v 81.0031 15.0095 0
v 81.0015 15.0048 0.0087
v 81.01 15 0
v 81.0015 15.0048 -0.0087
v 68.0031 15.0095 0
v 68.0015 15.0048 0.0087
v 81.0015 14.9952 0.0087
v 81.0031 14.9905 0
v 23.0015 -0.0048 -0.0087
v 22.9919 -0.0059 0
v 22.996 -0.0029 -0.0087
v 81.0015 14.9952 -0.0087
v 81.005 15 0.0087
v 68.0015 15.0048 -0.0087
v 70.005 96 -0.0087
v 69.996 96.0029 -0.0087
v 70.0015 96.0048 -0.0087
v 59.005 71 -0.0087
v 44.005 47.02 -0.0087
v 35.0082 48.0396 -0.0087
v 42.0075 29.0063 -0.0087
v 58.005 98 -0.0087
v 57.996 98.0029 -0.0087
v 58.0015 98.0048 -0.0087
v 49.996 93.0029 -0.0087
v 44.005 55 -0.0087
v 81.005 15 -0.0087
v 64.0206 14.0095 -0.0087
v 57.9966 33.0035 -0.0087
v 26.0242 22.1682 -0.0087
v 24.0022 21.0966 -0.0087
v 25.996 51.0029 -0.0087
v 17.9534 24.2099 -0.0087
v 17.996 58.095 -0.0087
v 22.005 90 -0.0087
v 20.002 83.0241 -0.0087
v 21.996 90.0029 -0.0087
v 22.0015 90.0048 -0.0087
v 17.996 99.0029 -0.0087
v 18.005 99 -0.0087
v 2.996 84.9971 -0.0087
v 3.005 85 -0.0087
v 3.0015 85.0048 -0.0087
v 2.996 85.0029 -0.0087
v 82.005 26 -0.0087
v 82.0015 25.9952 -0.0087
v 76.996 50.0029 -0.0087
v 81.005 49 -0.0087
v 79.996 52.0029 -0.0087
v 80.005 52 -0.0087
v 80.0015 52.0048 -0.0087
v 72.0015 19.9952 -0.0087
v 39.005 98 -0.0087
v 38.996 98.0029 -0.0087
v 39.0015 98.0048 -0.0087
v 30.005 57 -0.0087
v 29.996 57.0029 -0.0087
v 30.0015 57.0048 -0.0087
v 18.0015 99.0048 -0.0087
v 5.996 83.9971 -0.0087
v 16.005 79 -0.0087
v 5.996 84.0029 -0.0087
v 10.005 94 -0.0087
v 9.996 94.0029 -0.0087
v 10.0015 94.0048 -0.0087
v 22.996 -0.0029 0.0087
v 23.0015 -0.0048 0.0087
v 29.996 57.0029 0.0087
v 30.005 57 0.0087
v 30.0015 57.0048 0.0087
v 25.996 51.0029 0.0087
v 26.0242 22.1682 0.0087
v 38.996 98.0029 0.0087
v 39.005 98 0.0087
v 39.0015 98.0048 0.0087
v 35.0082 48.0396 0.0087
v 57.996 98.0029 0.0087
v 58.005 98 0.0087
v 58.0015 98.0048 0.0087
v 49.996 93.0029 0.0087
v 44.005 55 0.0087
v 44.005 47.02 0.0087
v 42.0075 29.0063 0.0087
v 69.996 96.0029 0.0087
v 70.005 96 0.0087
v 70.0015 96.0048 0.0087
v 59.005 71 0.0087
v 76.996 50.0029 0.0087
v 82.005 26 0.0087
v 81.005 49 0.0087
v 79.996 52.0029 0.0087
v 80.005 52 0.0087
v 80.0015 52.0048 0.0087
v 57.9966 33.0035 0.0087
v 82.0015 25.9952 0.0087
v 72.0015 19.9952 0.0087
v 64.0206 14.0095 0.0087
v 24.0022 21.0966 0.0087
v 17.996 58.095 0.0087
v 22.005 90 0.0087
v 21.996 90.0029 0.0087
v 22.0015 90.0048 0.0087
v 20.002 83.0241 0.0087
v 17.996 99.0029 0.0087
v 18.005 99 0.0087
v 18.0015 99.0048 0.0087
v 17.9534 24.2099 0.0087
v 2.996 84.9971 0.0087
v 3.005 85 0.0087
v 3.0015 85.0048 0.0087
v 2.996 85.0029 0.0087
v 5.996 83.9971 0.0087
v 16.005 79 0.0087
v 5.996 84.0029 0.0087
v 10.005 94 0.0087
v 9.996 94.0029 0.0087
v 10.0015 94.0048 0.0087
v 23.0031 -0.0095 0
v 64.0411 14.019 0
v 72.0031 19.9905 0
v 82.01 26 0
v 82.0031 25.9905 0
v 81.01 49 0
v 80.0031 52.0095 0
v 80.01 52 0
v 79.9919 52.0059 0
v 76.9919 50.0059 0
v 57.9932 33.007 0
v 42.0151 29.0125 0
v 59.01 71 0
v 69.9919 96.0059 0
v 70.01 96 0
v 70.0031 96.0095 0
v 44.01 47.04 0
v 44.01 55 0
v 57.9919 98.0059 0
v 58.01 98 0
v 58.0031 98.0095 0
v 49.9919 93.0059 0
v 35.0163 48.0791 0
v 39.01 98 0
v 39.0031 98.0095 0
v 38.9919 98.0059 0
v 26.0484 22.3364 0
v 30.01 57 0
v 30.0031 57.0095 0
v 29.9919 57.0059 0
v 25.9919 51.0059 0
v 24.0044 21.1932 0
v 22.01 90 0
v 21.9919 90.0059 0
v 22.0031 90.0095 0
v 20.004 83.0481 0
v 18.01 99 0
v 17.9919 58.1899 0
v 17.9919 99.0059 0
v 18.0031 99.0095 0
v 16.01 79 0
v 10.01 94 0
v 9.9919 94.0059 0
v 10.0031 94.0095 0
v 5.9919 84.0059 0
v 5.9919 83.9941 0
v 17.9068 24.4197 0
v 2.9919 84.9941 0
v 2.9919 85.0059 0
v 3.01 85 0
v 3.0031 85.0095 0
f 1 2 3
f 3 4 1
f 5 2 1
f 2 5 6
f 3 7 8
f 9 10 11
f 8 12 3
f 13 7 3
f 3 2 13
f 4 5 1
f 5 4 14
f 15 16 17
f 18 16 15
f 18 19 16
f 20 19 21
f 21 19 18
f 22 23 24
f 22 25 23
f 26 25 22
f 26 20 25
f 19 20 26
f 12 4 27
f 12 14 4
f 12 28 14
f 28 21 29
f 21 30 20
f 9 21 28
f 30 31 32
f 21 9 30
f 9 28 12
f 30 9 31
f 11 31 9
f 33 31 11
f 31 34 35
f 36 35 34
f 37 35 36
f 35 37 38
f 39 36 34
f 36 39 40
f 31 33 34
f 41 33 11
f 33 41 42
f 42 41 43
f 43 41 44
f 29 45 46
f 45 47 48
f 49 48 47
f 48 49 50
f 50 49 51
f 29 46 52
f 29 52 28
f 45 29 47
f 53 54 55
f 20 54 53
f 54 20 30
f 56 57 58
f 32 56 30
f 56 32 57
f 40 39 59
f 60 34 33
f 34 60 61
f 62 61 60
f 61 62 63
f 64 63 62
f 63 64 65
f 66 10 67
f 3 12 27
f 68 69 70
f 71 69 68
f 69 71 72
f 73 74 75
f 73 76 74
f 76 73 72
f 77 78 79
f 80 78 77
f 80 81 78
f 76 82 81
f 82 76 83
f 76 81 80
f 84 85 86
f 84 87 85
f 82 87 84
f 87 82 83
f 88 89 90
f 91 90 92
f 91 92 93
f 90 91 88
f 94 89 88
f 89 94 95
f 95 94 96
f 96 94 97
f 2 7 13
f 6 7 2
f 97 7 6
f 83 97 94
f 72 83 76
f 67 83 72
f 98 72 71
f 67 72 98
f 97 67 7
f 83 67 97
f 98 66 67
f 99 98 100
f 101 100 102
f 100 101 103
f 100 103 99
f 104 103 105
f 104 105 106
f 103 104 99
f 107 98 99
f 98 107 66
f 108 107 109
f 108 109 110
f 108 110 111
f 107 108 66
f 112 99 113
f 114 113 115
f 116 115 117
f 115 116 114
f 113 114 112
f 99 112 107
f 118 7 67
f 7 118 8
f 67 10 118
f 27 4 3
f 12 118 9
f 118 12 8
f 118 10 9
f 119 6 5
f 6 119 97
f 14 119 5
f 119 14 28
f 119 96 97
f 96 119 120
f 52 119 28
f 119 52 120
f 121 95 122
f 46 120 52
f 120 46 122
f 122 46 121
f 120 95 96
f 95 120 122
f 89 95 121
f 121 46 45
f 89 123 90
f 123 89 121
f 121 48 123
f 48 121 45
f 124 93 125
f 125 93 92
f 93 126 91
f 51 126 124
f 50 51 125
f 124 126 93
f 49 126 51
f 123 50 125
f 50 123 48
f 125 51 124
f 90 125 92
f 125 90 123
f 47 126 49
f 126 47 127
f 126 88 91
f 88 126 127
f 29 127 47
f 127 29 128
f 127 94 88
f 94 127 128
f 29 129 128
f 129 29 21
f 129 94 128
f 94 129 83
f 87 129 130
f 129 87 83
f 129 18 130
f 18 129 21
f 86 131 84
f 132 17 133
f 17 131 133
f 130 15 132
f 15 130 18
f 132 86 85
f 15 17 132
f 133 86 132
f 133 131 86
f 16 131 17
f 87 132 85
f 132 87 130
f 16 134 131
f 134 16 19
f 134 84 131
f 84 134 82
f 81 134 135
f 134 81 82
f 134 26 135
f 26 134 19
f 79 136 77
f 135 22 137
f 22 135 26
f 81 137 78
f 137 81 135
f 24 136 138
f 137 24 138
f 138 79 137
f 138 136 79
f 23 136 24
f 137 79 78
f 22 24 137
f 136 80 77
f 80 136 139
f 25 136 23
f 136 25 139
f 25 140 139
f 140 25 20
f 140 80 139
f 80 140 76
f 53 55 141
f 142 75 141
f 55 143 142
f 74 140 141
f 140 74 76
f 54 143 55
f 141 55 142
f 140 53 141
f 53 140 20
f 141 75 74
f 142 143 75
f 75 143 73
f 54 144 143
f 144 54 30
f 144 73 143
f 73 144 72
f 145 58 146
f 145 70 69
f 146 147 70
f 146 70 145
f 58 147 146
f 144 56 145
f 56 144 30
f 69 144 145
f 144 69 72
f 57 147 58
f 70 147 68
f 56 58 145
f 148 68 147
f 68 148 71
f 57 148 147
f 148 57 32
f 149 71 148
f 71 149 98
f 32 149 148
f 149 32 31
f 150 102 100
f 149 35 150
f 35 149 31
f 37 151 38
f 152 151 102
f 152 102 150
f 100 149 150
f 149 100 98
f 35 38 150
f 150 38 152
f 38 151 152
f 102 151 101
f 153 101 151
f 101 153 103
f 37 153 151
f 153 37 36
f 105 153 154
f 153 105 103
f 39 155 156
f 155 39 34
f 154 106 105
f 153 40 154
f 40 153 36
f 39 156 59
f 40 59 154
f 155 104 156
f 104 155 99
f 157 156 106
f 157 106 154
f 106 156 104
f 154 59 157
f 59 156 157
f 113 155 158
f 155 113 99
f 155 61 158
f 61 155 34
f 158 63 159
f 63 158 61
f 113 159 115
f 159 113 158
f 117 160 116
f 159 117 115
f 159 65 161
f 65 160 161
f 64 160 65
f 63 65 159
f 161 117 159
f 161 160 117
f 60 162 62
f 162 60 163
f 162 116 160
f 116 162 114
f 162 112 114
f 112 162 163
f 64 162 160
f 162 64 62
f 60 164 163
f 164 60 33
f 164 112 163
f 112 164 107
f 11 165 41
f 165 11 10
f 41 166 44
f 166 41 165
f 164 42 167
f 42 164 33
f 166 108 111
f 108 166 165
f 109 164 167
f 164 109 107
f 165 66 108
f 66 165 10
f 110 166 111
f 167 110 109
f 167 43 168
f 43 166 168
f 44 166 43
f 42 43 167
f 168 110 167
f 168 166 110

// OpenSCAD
color([0.9135118305629362,0.3823609034395232,0.42581309278619206]) hull(){
    translate([23,0]) sphere(0.01);
    translate([81,15]) sphere(0.01);
    translate([68,15]) sphere(0.01);
}
color([0.08967296065919184,0.0016857337534631478,0.31287848776698257]) hull(){
    translate([23,0]) sphere(0.01);
    translate([68,15]) sphere(0.01);
    translate([64,14]) sphere(0.01);
}
color([0.09731792302828757,0.364404074066101,0.8754307508322564]) hull(){
    translate([23,0]) sphere(0.01);
    translate([64,14]) sphere(0.01);
    translate([72,20]) sphere(0.01);
}
color([0.6967090939923642,0.5776053806129825,0.18685318159950626]) hull(){
    translate([23,0]) sphere(0.01);
    translate([72,20]) sphere(0.01);
    translate([82,26]) sphere(0.01);
}
color([0.9585806736472646,0.593334846568766,0.09927504601217696]) hull(){
    translate([23,0]) sphere(0.01);
    translate([82,26]) sphere(0.01);
    translate([81,49]) sphere(0.01);
}
color([0.19313665173925,0.6863688301261038,0.2093263356404984]) hull(){
    translate([23,0]) sphere(0.01);
    translate([81,49]) sphere(0.01);
    translate([80,52]) sphere(0.01);
}
color([0.2694340379225941,0.24598969558588324,0.16092298384524362]) hull(){
    translate([23,0]) sphere(0.01);
    translate([80,52]) sphere(0.01);
    translate([77,50]) sphere(0.01);
}
color([0.5102606956149307,0.431705445139412,0.38909399282504675]) hull(){
    translate([23,0]) sphere(0.01);
    translate([77,50]) sphere(0.01);
    translate([58,33]) sphere(0.01);
}
color([0.3194819673674283,0.6655357355223767,0.22692357675811492]) hull(){
    translate([23,0]) sphere(0.01);
    translate([58,33]) sphere(0.01);
    translate([42,29]) sphere(0.01);
}
color([0.9464906820257937,0.35776616524050997,0.9421064453260054]) hull(){
    translate([23,0]) sphere(0.01);
    translate([42,29]) sphere(0.01);
    translate([59,71]) sphere(0.01);
}
color([0.3792404853118415,0.27508202782836655,0.9368074710650367]) hull(){
    translate([23,0]) sphere(0.01);
    translate([59,71]) sphere(0.01);
    translate([70,96]) sphere(0.01);
}
color([0.7670397757471089,0.17483880300164423,0.7474114244696689]) hull(){
    translate([23,0]) sphere(0.01);
    translate([70,96]) sphere(0.01);
    translate([44,47]) sphere(0.01);
}
color([0.6015236368594579,0.5872808850844162,0.28390336255679416]) hull(){
    translate([23,0]) sphere(0.01);
    translate([44,47]) sphere(0.01);
    translate([44,55]) sphere(0.01);
}
color([0.5839405385485582,0.4048698908705002,0.6877557316706271]) hull(){
    translate([23,0]) sphere(0.01);
    translate([44,55]) sphere(0.01);
    translate([58,98]) sphere(0.01);
}
color([0.29310936231965135,0.08456113000314536,0.6409271470126323]) hull(){
    translate([23,0]) sphere(0.01);
    translate([58,98]) sphere(0.01);
    translate([50,93]) sphere(0.01);
}
color([0.38512246522478266,0.6162859510128613,0.407224705538046]) hull(){
    translate([23,0]) sphere(0.01);
    translate([50,93]) sphere(0.01);
    translate([35,48]) sphere(0.01);
}
color([0.6107800780239486,0.9541913078580654,0.09369719926319908]) hull(){
    translate([23,0]) sphere(0.01);
    translate([35,48]) sphere(0.01);
    translate([39,98]) sphere(0.01);
}
color([0.4396226851829427,0.9817497074141792,0.30111933510979894]) hull(){
    translate([23,0]) sphere(0.01);
    translate([39,98]) sphere(0.01);
    translate([26,22]) sphere(0.01);
}
color([0.08571041628526821,0.691130580335744,0.16573157374072334]) hull(){
    translate([23,0]) sphere(0.01);
    translate([26,22]) sphere(0.01);
    translate([30,57]) sphere(0.01);
}
color([0.4668304924867862,0.30100213617539295,0.3511677492745029]) hull(){
    translate([23,0]) sphere(0.01);
    translate([30,57]) sphere(0.01);
    translate([26,51]) sphere(0.01);
}
color([0.05564944269037686,0.7696481469448815,0.686275624239137]) hull(){
    translate([23,0]) sphere(0.01);
    translate([26,51]) sphere(0.01);
    translate([24,21]) sphere(0.01);
}
color([0.15447252119296884,0.35335085758162643,0.18799175914388588]) hull(){
    translate([23,0]) sphere(0.01);
    translate([24,21]) sphere(0.01);
    translate([22,90]) sphere(0.01);
}
color([0.41322879780265653,0.82270842281296,0.9057146612667819]) hull(){
    translate([23,0]) sphere(0.01);
    translate([22,90]) sphere(0.01);
    translate([20,83]) sphere(0.01);
}
color([0.9688547633127277,0.5528378273263655,0.12760284187612392]) hull(){
    translate([23,0]) sphere(0.01);
    translate([20,83]) sphere(0.01);
    translate([18,99]) sphere(0.01);
}
color([0.1710979555253146,0.7131998843266452,0.6397779425125977]) hull(){
    translate([23,0]) sphere(0.01);
    translate([18,99]) sphere(0.01);
    translate([18,58]) sphere(0.01);
}
color([0.57496968906483,0.8489371230716904,0.07944838941339594]) hull(){
    translate([23,0]) sphere(0.01);
    translate([18,58]) sphere(0.01);
    translate([16,79]) sphere(0.01);
}
color([0.040333123224873146,0.9305910632054132,0.3080440975445232]) hull(){
    translate([23,0]) sphere(0.01);
    translate([16,79]) sphere(0.01);
    translate([10,94]) sphere(0.01);
}
color([0.6084655882345898,0.4923441190446234,0.7069385087242315]) hull(){
    translate([23,0]) sphere(0.01);
    translate([10,94]) sphere(0.01);
    translate([6,84]) sphere(0.01);
}
color([0.6803385961846494,0.18024793645131376,0.10787678186317007]) hull(){
    translate([23,0]) sphere(0.01);
    translate([6,84]) sphere(0.01);
    translate([18,24]) sphere(0.01);
}
color([0.1335624130282893,0.47731112778056706,0.8393950916733898]) hull(){
    translate([23,0]) sphere(0.01);
    translate([18,24]) sphere(0.01);
    translate([3,85]) sphere(0.01);
}
